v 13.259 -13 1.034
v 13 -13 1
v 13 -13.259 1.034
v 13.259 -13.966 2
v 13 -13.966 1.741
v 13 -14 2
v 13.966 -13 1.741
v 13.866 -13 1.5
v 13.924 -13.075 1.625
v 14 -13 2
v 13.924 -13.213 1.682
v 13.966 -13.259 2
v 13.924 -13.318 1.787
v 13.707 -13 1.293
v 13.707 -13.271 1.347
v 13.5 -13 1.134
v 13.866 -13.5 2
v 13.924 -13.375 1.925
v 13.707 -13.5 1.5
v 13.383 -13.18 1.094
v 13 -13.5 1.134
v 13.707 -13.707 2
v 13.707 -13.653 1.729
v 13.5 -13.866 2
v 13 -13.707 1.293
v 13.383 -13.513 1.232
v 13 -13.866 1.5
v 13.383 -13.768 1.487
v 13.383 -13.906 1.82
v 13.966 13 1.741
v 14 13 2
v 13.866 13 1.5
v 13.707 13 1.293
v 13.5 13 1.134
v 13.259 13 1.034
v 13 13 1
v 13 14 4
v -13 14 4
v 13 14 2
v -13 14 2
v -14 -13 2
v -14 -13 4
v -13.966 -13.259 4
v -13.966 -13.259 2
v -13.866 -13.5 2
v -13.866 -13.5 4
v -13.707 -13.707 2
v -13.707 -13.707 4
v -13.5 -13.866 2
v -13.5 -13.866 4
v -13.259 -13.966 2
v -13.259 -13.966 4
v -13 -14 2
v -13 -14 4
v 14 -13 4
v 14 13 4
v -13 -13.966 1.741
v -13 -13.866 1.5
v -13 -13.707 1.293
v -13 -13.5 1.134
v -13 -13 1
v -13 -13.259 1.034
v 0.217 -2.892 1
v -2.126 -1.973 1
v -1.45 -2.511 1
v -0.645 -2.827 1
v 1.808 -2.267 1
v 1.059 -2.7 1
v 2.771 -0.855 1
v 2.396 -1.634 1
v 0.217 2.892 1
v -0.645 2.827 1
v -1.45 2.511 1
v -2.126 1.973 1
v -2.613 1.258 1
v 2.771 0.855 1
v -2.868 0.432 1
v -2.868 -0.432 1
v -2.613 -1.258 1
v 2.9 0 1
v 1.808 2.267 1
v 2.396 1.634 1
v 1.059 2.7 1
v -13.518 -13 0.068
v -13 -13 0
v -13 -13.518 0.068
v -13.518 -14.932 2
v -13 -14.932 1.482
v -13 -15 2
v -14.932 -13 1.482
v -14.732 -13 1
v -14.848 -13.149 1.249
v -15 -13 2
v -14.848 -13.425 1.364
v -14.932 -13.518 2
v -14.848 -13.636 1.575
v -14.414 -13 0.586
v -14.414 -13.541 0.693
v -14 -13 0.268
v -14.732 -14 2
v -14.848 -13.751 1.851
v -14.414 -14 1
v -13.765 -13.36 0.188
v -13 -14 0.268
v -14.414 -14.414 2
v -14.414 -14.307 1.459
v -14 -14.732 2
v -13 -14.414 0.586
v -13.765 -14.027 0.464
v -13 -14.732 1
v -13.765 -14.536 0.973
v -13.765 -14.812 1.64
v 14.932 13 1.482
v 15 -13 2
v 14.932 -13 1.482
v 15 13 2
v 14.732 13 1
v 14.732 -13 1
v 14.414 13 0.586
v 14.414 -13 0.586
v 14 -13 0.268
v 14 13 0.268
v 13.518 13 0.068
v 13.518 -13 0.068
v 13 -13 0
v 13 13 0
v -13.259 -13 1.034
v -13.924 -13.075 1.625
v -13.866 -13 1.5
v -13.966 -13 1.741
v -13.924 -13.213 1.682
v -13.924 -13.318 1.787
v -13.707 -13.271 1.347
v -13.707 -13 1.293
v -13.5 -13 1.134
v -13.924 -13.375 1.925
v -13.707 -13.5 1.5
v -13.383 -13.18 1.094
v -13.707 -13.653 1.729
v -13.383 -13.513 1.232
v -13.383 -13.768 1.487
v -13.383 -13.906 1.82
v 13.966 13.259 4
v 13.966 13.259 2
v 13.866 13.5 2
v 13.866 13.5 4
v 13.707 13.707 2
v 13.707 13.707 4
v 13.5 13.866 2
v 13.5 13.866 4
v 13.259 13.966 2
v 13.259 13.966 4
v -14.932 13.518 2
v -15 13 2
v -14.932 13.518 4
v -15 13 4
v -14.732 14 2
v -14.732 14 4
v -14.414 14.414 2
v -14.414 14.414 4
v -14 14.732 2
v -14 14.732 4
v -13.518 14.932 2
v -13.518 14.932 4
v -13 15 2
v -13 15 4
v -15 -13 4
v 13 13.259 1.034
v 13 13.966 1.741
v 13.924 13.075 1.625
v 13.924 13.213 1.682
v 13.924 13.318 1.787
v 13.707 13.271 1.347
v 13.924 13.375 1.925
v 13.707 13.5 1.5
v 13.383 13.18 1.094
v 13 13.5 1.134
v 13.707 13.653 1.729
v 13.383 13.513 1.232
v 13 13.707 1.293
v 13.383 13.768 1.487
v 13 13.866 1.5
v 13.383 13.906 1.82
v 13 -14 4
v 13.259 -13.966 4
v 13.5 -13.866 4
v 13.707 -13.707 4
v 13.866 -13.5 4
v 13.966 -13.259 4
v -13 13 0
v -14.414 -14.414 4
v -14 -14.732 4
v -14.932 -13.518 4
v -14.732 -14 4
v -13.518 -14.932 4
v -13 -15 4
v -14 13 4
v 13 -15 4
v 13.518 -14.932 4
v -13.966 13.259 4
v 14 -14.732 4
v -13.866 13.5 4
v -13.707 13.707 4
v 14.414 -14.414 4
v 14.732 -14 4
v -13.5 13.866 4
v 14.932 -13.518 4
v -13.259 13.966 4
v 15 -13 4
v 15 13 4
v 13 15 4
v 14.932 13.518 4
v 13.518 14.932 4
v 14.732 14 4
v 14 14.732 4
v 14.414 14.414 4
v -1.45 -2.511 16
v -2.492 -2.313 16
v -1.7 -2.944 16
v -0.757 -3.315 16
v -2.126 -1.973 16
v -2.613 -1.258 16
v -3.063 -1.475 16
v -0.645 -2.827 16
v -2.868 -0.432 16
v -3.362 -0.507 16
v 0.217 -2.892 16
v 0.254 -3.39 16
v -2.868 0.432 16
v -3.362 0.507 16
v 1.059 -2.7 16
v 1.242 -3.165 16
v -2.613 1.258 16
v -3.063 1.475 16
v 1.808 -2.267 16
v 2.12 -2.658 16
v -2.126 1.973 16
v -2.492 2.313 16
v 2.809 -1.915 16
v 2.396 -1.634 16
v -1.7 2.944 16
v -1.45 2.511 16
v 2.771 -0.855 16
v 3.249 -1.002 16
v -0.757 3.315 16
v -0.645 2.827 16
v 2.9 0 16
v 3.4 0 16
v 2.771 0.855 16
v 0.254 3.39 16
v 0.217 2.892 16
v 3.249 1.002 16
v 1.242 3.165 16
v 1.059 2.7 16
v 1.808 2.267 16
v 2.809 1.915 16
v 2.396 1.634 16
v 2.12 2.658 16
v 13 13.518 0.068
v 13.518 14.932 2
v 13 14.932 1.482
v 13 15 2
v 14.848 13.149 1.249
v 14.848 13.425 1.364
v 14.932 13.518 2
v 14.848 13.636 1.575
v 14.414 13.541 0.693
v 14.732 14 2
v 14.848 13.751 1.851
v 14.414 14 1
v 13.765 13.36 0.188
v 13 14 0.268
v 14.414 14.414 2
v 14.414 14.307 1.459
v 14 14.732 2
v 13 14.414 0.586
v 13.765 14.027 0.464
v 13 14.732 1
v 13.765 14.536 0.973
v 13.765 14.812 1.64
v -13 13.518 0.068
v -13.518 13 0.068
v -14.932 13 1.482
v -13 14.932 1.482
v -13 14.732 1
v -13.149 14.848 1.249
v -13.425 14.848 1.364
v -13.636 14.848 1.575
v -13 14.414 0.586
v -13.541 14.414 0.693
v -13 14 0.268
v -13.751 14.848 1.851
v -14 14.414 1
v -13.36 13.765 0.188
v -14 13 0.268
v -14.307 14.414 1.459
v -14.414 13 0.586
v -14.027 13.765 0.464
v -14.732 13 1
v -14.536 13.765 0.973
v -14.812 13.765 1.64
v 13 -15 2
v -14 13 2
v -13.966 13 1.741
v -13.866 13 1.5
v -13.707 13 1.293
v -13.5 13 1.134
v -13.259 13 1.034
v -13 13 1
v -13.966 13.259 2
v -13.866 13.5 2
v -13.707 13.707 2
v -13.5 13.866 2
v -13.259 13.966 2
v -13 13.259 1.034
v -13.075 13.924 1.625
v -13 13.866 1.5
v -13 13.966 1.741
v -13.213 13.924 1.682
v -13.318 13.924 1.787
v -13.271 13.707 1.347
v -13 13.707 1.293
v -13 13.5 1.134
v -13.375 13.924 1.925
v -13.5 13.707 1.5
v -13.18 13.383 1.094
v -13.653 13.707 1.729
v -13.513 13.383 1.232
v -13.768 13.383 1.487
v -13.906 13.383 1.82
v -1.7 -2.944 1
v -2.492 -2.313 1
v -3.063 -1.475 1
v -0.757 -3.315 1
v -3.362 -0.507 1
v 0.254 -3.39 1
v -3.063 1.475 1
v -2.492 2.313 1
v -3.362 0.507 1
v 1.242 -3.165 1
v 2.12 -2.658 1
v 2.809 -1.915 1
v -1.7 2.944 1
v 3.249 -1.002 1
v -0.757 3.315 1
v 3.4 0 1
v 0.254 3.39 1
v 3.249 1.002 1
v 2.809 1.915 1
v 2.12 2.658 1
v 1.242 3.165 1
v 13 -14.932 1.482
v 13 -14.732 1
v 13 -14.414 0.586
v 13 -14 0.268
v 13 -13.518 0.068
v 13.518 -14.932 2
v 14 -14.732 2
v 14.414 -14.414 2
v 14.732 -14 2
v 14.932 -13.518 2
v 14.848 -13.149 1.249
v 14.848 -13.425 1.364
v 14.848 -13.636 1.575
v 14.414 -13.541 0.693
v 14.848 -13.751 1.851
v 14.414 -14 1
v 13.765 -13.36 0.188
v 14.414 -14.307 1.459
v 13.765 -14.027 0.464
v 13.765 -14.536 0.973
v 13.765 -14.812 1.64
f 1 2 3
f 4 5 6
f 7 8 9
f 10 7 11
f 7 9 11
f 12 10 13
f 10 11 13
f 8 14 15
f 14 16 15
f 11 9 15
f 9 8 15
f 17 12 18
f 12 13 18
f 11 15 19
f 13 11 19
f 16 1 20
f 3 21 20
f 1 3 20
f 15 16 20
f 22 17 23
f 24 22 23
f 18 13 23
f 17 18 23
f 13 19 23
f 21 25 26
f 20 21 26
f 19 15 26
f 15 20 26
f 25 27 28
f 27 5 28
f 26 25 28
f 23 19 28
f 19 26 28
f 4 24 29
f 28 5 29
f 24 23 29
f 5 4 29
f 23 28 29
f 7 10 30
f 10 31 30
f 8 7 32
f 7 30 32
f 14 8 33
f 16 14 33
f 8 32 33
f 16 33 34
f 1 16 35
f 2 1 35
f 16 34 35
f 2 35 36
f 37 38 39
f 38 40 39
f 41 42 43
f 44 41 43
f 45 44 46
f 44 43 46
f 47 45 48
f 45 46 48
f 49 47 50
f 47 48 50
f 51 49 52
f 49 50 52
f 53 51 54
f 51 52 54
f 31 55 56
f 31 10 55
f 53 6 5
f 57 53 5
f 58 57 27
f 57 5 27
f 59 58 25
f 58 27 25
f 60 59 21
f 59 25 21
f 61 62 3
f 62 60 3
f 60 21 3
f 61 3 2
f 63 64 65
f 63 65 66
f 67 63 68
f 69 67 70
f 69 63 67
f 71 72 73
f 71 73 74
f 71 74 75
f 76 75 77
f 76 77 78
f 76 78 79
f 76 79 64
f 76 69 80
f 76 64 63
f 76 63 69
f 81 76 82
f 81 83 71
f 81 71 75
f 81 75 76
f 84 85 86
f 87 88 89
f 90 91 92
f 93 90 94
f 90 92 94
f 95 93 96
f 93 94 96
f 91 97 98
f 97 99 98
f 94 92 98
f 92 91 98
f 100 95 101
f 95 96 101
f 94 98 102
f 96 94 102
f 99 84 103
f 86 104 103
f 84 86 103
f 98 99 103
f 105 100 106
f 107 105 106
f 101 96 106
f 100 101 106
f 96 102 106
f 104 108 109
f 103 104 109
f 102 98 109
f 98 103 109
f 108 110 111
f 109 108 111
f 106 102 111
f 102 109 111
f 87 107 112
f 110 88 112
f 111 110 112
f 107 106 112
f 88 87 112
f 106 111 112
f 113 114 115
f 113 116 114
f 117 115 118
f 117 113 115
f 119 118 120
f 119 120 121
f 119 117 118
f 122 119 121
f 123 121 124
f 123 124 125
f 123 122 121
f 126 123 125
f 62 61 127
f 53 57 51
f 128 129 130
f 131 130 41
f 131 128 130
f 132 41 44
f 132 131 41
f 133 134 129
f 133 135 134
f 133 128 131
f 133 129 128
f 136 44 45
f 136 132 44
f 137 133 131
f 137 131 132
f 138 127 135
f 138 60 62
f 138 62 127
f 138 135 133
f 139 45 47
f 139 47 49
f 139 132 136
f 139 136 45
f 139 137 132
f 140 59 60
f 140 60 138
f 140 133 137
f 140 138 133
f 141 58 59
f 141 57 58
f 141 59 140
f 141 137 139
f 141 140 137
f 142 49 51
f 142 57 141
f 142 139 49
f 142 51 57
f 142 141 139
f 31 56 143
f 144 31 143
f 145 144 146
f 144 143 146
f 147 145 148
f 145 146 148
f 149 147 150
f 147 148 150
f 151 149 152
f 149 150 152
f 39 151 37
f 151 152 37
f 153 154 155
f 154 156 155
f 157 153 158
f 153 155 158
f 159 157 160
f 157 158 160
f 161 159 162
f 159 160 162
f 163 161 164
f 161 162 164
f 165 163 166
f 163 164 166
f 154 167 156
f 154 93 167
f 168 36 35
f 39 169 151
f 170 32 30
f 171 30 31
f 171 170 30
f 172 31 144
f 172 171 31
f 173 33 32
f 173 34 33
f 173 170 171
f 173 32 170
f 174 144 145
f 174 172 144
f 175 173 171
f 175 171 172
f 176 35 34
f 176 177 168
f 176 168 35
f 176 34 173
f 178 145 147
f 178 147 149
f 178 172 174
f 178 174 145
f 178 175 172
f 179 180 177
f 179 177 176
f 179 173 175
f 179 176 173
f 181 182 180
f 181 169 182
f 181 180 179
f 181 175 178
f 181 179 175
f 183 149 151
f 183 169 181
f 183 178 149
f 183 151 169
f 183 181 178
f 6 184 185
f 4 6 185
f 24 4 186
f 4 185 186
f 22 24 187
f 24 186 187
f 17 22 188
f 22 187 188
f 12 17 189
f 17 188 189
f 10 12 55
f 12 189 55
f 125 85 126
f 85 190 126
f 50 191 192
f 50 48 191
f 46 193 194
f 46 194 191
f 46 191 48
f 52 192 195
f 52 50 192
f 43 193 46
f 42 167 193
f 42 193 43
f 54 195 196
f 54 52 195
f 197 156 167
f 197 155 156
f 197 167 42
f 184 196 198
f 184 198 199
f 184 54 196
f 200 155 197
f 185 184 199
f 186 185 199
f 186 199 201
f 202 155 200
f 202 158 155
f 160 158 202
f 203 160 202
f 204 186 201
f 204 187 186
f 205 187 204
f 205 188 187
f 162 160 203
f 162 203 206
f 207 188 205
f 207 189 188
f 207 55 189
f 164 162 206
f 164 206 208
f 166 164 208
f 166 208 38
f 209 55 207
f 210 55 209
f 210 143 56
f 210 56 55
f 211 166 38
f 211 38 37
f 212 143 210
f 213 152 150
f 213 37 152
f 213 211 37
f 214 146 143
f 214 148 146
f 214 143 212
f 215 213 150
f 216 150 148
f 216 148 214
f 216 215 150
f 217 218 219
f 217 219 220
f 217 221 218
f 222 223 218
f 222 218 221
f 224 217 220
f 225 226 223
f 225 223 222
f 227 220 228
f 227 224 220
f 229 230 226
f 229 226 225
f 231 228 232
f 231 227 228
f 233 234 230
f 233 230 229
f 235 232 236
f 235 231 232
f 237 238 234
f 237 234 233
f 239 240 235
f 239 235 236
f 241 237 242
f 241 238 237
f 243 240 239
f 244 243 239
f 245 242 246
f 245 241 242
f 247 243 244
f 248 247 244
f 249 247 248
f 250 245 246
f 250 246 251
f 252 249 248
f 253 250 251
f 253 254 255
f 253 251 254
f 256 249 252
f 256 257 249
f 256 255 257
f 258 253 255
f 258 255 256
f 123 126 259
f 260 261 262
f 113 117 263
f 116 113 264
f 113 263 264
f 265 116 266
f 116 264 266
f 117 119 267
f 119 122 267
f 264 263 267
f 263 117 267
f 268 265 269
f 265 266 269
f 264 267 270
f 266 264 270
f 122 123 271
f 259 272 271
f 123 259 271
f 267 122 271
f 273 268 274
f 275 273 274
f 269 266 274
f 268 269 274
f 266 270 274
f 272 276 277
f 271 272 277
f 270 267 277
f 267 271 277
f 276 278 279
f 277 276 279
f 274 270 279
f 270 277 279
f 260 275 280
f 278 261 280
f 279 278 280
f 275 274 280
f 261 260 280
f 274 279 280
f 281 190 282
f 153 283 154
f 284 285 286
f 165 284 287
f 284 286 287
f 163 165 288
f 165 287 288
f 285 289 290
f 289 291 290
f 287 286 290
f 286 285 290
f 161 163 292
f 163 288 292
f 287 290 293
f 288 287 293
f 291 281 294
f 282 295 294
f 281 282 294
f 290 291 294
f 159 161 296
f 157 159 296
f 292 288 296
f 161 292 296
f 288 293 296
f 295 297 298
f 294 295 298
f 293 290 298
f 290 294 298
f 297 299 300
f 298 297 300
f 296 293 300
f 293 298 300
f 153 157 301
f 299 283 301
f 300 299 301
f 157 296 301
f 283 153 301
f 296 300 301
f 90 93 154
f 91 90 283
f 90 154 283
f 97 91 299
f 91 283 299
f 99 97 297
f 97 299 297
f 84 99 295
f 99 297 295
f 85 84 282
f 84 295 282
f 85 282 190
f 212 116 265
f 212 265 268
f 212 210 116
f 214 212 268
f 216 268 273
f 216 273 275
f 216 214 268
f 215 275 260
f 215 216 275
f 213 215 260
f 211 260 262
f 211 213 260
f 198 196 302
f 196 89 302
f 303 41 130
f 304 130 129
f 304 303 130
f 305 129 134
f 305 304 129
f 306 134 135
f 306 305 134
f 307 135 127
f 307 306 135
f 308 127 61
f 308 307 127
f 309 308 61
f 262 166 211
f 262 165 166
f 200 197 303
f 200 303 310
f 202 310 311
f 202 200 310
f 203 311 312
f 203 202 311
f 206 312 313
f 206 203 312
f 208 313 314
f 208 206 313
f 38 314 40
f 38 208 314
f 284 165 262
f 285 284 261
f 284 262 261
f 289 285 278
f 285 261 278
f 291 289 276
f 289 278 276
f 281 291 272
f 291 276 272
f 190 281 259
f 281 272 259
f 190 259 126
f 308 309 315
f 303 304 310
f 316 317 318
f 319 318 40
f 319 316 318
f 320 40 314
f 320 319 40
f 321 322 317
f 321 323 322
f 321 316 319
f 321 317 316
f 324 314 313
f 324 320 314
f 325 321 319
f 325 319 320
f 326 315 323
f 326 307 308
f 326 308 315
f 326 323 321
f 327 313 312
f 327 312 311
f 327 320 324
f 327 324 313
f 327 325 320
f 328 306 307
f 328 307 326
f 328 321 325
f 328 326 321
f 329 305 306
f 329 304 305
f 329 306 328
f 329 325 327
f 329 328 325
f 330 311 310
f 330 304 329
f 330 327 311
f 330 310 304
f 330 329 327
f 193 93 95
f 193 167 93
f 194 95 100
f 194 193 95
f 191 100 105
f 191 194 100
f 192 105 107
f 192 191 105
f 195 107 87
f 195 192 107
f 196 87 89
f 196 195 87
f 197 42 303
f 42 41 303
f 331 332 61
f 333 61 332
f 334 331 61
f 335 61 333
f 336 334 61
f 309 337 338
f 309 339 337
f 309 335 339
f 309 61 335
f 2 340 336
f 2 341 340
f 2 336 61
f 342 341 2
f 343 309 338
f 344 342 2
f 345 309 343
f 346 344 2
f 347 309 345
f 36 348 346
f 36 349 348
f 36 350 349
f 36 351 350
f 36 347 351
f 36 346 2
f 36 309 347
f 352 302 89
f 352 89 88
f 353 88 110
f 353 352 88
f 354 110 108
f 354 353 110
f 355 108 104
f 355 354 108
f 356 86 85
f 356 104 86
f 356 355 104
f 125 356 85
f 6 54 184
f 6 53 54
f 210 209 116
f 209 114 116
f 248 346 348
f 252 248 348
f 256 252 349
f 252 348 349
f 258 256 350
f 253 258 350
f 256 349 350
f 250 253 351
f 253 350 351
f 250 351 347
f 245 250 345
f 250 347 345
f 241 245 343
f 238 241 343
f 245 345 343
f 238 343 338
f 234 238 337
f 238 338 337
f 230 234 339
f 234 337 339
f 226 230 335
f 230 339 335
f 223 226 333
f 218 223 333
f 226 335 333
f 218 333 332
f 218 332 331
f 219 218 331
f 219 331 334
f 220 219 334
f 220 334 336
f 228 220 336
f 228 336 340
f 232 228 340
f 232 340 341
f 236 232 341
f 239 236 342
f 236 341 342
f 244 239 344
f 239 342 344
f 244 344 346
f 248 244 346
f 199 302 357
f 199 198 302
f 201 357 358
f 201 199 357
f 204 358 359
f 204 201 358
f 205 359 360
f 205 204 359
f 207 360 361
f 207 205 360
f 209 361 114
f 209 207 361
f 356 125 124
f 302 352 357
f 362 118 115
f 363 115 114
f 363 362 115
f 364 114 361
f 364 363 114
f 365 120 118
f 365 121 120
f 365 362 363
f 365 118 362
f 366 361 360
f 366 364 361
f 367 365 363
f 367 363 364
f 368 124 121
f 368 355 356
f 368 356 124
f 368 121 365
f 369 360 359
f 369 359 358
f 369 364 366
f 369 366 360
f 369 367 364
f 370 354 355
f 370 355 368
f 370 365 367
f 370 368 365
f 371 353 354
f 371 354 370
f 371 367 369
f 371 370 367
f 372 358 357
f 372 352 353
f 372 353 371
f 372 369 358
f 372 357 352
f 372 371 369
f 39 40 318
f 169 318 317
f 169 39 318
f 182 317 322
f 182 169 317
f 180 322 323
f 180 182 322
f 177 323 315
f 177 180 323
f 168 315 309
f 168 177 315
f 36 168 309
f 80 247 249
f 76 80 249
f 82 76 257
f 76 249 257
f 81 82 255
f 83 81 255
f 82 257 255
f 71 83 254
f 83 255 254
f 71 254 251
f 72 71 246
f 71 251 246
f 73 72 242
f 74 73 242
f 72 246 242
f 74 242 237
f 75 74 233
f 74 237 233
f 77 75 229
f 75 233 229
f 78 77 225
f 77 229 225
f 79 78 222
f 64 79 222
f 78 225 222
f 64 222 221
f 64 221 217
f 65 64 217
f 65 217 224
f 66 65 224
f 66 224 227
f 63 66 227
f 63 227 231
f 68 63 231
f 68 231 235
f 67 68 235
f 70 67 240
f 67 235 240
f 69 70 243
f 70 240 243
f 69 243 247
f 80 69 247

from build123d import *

# Parameters (mm, degrees)
SKETCH_1_W          = 30
SKETCH_1_H          = 30
EXTRUDE_1_DEPTH     = 4
FILLET_1_R          = 2
SHELL_1_T           = -1
SKETCH_2_R          = 3.4
EXTRUDE_2_DEPTH     = 15
SKETCH_3_R          = 2.9
CUT_EXTRUDE_1_DEPTH = 15


with BuildPart() as part:
    # 草图1 → 凸台-拉伸1 (new body)
    with BuildSketch(Plane.XY):
        Rectangle(SKETCH_1_W, SKETCH_1_H)
    extrude(amount=EXTRUDE_1_DEPTH)

    # 圆角1
    fillet_1_edges = [part.edges().sort_by_distance(p)[0] for p in [
        (0, -15, 0),
        (-15, 0, 0),
        (0, 15, 0),
        (15, 0, 0),
        (15, -15, 2),
        (-15, -15, 2),
        (-15, 15, 2),
        (15, 15, 2),
    ]]
    fillet(fillet_1_edges, radius=FILLET_1_R)

    # 抽壳1
    shell_1_openings = [part.faces().sort_by_distance(p)[0] for p in [
        (0, 0, 4),
    ]]
    offset(amount=SHELL_1_T, openings=shell_1_openings, kind=Kind.INTERSECTION)

    # 草图2 → 凸台-拉伸2 (add)
    with BuildSketch(Plane.XY.offset(1)):
        Circle(SKETCH_2_R)
    extrude(amount=EXTRUDE_2_DEPTH)

    # 草图3 → 切除-拉伸1 (cut)
    with BuildSketch(Plane.XY.offset(16)):
        Circle(SKETCH_3_R)
    extrude(amount=-CUT_EXTRUDE_1_DEPTH, mode=Mode.SUBTRACT)


solid = part.part
